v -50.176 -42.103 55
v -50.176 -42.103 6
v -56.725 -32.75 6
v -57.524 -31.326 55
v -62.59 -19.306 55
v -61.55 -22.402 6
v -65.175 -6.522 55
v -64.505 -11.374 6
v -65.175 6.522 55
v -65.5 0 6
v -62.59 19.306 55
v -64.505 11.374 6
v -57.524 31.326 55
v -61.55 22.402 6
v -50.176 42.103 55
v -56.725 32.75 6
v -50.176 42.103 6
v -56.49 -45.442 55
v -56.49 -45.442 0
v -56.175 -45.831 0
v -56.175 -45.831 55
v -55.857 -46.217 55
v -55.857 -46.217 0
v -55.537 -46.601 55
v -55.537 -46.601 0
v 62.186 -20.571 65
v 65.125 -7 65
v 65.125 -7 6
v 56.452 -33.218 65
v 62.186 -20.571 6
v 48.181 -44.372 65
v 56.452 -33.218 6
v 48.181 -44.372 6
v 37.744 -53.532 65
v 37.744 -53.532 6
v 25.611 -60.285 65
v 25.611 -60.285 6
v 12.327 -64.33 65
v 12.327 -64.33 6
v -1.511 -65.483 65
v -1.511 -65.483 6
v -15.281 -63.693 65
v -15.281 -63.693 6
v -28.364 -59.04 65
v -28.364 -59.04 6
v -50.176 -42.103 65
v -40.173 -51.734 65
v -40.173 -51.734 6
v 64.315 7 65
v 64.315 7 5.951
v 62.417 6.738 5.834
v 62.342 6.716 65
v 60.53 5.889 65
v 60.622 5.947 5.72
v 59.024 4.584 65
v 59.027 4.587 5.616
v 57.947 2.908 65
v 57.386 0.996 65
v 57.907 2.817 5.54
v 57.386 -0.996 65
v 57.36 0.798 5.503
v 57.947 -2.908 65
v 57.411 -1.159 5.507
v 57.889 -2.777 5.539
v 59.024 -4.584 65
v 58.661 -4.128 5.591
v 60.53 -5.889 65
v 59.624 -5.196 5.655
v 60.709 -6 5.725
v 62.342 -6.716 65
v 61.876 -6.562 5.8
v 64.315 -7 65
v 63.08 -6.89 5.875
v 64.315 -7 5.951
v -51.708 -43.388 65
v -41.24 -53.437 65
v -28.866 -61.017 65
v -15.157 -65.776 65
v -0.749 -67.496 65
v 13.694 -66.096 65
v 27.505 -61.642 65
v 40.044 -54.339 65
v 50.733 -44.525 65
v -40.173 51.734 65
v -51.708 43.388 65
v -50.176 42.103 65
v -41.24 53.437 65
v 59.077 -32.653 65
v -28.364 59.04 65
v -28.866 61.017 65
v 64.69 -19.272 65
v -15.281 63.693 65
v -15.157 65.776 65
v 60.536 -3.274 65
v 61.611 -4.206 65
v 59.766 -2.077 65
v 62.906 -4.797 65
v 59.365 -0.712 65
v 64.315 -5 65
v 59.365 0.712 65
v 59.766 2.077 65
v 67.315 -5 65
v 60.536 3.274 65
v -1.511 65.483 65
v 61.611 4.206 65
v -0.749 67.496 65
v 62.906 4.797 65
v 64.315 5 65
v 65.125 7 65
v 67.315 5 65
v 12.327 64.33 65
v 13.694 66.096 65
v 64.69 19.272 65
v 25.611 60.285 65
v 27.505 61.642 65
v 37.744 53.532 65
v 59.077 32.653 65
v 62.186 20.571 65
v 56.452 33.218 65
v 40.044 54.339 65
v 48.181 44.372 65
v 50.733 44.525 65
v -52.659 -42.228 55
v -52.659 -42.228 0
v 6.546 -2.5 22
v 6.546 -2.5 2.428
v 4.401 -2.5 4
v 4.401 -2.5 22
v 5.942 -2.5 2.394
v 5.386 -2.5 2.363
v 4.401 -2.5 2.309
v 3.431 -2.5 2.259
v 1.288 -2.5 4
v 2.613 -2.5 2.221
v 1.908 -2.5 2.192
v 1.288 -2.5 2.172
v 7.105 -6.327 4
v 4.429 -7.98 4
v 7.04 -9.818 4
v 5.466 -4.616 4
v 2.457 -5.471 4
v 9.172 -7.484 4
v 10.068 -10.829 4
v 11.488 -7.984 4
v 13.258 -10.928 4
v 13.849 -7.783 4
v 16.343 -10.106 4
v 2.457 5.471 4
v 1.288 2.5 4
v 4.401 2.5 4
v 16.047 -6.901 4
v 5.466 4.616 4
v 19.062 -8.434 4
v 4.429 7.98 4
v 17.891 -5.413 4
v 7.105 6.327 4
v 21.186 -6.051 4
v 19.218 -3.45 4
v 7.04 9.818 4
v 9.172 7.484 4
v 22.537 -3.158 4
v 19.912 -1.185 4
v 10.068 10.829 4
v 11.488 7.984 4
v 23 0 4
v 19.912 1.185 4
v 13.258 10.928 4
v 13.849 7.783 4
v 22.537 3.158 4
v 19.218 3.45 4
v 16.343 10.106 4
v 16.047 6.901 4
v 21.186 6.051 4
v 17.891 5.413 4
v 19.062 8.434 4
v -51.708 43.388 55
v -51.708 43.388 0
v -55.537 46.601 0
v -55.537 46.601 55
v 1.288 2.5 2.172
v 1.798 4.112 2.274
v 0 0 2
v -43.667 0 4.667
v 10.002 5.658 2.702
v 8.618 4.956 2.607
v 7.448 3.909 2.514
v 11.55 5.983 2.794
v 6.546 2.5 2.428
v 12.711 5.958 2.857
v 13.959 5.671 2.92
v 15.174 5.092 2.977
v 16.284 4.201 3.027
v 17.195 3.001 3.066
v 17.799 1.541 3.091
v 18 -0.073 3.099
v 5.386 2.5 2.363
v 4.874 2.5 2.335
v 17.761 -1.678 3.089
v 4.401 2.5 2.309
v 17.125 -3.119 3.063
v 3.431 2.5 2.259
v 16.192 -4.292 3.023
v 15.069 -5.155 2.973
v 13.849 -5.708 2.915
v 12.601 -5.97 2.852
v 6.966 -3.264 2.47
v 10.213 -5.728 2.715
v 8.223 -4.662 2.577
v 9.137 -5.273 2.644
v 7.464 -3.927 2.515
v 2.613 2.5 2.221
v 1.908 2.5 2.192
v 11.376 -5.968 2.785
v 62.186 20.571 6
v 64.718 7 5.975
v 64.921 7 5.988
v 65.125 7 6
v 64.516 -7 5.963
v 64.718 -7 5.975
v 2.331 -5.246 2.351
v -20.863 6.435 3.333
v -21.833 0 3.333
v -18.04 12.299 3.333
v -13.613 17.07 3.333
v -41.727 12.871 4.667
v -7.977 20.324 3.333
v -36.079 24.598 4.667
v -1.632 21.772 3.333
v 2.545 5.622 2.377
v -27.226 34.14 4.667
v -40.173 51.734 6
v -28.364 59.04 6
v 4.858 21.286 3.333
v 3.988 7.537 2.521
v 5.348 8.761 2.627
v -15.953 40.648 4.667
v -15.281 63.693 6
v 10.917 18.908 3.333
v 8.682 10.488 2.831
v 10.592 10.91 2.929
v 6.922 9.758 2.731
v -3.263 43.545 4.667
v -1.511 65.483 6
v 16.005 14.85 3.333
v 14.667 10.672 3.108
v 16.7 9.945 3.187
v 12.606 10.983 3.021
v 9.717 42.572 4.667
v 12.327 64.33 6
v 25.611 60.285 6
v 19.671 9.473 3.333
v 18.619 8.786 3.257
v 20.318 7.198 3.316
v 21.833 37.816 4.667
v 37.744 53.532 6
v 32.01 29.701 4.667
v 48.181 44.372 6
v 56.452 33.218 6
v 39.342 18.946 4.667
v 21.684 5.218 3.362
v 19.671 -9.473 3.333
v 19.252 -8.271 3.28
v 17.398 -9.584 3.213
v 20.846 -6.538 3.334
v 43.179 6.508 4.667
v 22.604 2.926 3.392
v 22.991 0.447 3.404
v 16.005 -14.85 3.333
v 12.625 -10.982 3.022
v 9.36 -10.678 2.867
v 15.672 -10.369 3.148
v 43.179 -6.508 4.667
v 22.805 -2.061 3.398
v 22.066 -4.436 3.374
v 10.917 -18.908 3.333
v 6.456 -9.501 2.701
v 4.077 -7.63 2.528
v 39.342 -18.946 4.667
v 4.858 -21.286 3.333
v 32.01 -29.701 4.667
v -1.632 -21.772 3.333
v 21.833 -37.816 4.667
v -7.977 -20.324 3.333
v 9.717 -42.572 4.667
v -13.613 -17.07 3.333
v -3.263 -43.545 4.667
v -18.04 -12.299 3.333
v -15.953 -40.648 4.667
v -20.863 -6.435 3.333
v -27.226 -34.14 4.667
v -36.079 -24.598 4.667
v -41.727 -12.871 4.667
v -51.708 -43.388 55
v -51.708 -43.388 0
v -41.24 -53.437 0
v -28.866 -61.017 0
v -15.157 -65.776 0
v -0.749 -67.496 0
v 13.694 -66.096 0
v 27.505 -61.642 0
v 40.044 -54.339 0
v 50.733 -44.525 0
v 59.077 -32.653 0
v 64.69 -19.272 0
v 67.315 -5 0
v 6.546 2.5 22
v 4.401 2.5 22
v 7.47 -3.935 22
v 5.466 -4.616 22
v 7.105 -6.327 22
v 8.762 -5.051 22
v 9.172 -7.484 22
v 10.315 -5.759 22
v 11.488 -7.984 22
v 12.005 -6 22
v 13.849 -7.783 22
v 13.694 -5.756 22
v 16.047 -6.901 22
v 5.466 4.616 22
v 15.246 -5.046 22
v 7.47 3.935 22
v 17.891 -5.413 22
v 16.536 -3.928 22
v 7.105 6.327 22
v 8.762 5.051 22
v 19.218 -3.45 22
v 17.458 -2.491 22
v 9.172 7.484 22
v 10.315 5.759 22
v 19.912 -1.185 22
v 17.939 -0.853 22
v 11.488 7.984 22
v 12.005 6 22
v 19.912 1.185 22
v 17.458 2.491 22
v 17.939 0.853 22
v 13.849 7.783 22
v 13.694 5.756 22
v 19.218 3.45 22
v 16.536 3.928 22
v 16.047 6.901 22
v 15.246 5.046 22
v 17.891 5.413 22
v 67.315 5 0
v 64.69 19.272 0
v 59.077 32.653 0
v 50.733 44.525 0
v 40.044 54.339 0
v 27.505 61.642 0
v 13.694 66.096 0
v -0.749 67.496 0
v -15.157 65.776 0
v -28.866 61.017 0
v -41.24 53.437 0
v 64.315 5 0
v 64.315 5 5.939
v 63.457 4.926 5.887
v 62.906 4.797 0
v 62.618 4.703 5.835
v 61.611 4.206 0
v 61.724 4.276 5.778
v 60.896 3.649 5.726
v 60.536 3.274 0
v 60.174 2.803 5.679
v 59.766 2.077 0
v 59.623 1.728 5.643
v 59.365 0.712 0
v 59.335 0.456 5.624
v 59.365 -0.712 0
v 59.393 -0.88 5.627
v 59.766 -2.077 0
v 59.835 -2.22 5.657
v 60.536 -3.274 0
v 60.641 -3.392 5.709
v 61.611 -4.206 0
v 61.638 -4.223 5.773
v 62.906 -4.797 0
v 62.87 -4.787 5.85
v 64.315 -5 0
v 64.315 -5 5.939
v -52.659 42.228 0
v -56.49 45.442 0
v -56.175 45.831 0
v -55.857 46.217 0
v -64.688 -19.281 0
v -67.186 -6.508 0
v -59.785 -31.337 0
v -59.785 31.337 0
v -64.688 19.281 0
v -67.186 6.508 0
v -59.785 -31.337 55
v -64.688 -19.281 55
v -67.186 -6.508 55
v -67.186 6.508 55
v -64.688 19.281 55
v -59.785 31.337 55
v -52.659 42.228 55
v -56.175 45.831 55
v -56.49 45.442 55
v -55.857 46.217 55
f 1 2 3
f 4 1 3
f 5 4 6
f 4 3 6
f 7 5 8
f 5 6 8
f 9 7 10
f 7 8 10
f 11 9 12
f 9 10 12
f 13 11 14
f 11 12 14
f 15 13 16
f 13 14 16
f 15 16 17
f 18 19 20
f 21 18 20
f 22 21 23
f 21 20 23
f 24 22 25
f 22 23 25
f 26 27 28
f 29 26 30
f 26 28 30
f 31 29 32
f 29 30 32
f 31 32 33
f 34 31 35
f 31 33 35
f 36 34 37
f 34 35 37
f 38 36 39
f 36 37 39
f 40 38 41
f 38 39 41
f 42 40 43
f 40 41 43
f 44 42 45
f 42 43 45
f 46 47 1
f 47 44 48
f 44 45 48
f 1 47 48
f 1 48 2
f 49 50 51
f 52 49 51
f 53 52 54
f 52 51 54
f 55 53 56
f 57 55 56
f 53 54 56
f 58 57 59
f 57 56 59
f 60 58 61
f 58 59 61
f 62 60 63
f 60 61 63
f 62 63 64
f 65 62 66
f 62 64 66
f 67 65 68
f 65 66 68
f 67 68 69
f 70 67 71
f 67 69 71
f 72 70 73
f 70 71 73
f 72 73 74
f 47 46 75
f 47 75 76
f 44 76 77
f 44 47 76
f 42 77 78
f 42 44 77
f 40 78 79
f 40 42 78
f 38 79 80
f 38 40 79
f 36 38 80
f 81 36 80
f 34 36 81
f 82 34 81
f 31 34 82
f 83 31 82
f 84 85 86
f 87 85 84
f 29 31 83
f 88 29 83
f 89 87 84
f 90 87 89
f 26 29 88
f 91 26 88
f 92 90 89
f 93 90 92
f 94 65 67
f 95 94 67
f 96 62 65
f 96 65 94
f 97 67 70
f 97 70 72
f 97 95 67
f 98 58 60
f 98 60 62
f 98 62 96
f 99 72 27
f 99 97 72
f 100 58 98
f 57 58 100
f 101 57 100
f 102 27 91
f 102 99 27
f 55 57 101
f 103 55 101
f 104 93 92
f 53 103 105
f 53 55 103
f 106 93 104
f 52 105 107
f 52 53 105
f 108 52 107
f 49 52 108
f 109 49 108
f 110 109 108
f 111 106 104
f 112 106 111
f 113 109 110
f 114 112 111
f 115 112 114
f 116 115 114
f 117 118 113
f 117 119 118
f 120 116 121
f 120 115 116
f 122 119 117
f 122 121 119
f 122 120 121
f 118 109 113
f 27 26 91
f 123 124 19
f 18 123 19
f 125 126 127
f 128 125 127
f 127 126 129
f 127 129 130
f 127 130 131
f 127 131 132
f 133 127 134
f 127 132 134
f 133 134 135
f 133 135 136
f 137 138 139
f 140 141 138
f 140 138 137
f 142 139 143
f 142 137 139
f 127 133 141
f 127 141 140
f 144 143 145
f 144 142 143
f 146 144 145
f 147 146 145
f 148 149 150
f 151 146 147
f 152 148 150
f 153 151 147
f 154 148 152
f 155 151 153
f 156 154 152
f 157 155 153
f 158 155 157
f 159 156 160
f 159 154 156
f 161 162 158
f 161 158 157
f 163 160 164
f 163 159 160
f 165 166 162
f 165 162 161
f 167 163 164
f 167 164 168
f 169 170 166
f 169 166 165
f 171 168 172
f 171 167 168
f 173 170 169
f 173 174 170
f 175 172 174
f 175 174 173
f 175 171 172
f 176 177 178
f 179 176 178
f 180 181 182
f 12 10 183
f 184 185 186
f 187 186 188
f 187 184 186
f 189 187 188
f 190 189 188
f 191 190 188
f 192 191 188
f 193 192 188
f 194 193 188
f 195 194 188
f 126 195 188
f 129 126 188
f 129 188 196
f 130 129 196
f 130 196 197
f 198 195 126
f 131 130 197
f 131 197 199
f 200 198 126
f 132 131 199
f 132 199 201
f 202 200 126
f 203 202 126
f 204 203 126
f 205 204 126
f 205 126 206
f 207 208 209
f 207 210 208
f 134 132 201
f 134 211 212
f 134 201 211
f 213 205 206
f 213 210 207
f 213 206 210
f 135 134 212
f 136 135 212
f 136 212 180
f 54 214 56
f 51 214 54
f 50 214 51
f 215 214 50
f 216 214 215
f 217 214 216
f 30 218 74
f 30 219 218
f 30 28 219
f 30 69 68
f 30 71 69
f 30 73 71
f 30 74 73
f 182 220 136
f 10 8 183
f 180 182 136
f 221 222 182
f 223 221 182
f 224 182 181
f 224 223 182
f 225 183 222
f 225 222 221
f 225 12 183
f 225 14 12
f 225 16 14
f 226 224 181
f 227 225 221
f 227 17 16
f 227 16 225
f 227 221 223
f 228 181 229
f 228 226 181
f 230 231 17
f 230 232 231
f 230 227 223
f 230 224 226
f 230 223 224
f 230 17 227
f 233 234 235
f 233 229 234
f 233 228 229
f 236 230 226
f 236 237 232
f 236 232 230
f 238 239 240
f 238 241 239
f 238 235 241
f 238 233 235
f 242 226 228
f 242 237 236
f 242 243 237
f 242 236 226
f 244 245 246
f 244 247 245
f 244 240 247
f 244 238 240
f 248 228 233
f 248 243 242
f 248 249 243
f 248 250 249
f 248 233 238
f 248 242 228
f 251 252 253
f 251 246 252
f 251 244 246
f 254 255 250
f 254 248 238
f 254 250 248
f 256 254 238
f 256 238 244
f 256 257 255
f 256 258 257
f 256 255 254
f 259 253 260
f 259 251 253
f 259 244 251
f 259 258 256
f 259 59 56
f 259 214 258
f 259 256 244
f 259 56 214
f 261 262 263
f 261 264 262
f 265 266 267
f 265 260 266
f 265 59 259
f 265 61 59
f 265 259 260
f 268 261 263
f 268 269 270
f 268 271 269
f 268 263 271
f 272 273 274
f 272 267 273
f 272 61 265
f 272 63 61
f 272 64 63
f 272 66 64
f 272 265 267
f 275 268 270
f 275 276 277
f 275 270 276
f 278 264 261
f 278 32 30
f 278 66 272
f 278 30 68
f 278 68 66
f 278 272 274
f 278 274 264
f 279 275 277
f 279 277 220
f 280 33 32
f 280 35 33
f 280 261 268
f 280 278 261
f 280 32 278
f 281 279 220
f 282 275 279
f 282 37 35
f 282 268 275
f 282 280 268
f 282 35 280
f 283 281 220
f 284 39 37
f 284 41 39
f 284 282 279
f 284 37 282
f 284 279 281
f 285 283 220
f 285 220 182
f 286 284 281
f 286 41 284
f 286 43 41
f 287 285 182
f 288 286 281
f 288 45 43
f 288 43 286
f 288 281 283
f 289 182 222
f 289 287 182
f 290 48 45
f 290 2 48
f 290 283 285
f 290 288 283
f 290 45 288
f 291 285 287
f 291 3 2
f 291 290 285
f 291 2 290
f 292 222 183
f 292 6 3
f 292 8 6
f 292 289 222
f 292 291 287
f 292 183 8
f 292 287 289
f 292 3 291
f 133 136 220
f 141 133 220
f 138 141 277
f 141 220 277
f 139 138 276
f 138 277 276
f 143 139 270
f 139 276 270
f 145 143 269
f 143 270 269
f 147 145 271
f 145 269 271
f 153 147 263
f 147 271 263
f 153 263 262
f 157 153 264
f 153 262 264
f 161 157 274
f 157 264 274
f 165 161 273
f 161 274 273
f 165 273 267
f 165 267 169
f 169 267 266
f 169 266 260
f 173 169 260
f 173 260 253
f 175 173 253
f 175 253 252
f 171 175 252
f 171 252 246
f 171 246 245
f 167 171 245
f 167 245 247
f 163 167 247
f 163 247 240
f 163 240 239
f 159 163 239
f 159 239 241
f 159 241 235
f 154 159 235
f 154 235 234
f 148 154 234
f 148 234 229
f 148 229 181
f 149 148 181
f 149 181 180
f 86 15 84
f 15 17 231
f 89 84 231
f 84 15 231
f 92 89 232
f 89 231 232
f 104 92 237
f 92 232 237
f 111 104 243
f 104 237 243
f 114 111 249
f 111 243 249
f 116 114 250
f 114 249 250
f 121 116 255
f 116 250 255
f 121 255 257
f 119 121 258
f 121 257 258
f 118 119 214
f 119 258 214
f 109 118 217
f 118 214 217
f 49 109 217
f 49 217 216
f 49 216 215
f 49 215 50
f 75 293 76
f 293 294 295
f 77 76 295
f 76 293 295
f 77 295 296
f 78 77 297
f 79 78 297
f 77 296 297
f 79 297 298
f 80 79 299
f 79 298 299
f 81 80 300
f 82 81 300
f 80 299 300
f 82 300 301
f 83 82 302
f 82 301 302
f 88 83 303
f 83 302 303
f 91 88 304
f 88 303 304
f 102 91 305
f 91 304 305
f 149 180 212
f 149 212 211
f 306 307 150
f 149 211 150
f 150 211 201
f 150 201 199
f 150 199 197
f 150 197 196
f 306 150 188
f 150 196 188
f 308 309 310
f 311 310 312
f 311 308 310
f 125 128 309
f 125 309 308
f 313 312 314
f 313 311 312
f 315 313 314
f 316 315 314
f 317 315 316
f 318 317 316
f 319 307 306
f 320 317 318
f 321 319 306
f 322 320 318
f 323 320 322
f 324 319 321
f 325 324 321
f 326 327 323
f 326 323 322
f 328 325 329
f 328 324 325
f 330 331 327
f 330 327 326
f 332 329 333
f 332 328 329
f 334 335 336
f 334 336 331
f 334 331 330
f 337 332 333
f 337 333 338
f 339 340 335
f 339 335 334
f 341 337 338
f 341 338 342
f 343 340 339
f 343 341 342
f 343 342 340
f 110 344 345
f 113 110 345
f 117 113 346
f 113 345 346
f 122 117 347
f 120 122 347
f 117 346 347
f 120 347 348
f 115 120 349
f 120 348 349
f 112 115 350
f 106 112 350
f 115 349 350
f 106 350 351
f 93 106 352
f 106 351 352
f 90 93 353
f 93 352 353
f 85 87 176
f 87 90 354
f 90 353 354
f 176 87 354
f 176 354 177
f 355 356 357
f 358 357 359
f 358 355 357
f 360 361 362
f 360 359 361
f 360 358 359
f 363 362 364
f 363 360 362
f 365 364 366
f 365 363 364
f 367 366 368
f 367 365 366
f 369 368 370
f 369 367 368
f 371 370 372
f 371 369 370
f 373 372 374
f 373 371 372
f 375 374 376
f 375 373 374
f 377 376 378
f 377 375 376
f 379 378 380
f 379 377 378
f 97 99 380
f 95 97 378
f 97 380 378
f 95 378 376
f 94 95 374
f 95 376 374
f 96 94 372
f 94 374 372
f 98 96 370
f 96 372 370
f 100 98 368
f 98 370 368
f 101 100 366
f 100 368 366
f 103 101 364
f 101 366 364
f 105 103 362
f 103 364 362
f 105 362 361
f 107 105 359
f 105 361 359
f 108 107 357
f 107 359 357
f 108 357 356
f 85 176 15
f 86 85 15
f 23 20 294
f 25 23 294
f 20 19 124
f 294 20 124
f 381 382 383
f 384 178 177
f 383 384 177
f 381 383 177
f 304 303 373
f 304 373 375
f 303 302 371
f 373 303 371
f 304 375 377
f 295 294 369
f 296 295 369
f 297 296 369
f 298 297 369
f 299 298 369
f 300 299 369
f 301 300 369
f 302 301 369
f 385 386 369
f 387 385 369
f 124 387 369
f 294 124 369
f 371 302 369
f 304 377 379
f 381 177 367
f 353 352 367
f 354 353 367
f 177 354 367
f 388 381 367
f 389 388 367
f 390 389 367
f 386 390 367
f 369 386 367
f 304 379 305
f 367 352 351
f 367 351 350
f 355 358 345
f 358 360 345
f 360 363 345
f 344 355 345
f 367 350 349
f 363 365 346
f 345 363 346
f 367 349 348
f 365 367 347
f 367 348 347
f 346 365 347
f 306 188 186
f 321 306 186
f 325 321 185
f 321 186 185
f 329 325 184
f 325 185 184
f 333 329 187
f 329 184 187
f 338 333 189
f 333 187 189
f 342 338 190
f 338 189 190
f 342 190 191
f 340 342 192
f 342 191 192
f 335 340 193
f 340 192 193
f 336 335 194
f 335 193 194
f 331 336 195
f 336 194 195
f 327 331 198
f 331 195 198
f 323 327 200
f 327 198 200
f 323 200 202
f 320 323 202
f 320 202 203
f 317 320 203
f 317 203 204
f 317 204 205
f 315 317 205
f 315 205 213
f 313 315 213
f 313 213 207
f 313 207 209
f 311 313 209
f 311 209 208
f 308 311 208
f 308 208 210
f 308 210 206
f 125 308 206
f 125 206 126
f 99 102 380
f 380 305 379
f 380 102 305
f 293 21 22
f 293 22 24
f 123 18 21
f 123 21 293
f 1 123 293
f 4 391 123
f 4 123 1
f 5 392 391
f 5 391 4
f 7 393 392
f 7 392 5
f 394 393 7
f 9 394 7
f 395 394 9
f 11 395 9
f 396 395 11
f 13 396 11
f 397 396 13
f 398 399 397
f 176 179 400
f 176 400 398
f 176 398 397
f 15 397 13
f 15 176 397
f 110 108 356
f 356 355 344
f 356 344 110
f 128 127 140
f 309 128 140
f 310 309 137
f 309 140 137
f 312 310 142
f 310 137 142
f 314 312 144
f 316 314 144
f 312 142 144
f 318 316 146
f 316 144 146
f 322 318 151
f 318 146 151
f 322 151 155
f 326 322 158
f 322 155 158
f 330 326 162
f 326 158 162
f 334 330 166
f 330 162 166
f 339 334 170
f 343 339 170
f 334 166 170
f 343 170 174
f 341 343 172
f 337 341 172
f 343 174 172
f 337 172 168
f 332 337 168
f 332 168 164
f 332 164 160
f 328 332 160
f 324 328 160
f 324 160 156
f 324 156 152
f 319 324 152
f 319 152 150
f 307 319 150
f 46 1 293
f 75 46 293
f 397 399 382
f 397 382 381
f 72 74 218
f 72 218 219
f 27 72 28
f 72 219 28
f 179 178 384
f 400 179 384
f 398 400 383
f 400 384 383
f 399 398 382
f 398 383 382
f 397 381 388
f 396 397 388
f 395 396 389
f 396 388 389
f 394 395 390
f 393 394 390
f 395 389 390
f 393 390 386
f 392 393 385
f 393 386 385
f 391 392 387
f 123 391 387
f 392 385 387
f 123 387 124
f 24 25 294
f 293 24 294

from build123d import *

# Parameters (mm, degrees)
F4_DEPTH = 65
F5_DEPTH = 55
F6_DEPTH = 65.001
F7_DEPTH = 22
F8_DEPTH = 4


with BuildPart() as f3:
    # F2 (on Front) → F3 (revolve)
    with BuildSketch(Plane.XZ):
        Polygon((-65.5, 0), (0, 0), (0, 2), (-65.5, 6), align=None)
    revolve(axis=Axis((0, 0, 1), (0, 0, -1)))

    # F0 (on Top) → F4 (join)
    with BuildSketch(Plane.XY):
        with BuildLine():
            ThreePointArc((-50.175911, 42.102588), (19.076579, 62.660467), (65.12488, 7))
            Line((65.12488, 7), (64.31456, 7))
            ThreePointArc((64.31456, 7), (57.31456, 0), (64.31456, -7))
            Line((64.31456, -7), (65.12488, -7))
            ThreePointArc((65.12488, -7), (19.076579, -62.660467), (-50.175911, -42.102588))
            Line((-50.175911, -42.102588), (-51.708, -43.388164))
            ThreePointArc((-51.708, -43.388164), (20.719651, -64.241311), (67.31456, -5))
            Line((67.31456, -5), (64.31456, -5))
            ThreePointArc((64.31456, -5), (59.31456, 0), (64.31456, 5))
            Line((64.31456, 5), (67.31456, 5))
            ThreePointArc((67.31456, 5), (20.719651, 64.241311), (-51.708, 43.388164))
            Line((-51.708, 43.388164), (-50.175911, 42.102588))
        make_face()
    extrude(amount=F4_DEPTH)

    # F0 (on Top) → F5 (join)
    with BuildSketch(Plane.XY):
        with BuildLine():
            Line((-55.537341, -46.601363), (-51.708, -43.388164))
            ThreePointArc((-51.708, -43.388164), (-52.186928, -42.810916), (-52.659412, -42.228383))
            Line((-52.659412, -42.228383), (-56.489635, -45.442321))
            ThreePointArc((-56.489635, -45.442321), (-56.016486, -46.024305), (-55.537341, -46.601363))
        make_face()
        with BuildLine():
            ThreePointArc((-50.175911, -42.102588), (-65.5, 0), (-50.175911, 42.102588))
            Line((-50.175911, 42.102588), (-51.708, 43.388164))
            ThreePointArc((-51.708, 43.388164), (-52.186928, 42.810916), (-52.659412, 42.228383))
            ThreePointArc((-52.659412, 42.228383), (-67.5, 0), (-52.659412, -42.228383))
            ThreePointArc((-52.659412, -42.228383), (-52.186928, -42.810916), (-51.708, -43.388164))
            Line((-51.708, -43.388164), (-50.175911, -42.102588))
        make_face()
        with BuildLine():
            ThreePointArc((-52.659412, 42.228383), (-52.186928, 42.810916), (-51.708, 43.388164))
            Line((-51.708, 43.388164), (-55.537341, 46.601363))
            ThreePointArc((-55.537341, 46.601363), (-56.016486, 46.024305), (-56.489635, 45.442321))
            Line((-56.489635, 45.442321), (-52.659412, 42.228383))
        make_face()
    extrude(amount=F5_DEPTH)

    # F0 (on Top) → F6 (cut, through all)
    with BuildSketch(Plane.XY):
        with BuildLine():
            ThreePointArc((67.31456, -5), (67.5, 0), (67.31456, 5))
            Line((67.31456, 5), (64.31456, 5))
            ThreePointArc((64.31456, 5), (59.31456, 0), (64.31456, -5))
            Line((64.31456, -5), (67.31456, -5))
        make_face()
    extrude(amount=F6_DEPTH, mode=Mode.SUBTRACT)

    # F1 (on Top) → F7 (join)
    with BuildSketch(Plane.XY):
        with BuildLine():
            Line((6.545644, -2.5), (4.400658, -2.5))
            ThreePointArc((4.400658, -2.5), (20, 0), (4.400658, 2.5))
            Line((4.400658, 2.5), (6.545644, 2.5))
            ThreePointArc((6.545644, 2.5), (18, 0), (6.545644, -2.5))
        make_face()
    extrude(amount=F7_DEPTH)

    # F1 (on Top) → F8 (join)
    with BuildSketch(Plane.XY):
        with BuildLine():
            ThreePointArc((4.400658, 2.5), (20, 0), (4.400658, -2.5))
            Line((4.400658, -2.5), (1.287857, -2.5))
            ThreePointArc((1.287857, -2.5), (23, 0), (1.287857, 2.5))
            Line((1.287857, 2.5), (4.400658, 2.5))
        make_face()
    extrude(amount=F8_DEPTH)


solid = f3.part
